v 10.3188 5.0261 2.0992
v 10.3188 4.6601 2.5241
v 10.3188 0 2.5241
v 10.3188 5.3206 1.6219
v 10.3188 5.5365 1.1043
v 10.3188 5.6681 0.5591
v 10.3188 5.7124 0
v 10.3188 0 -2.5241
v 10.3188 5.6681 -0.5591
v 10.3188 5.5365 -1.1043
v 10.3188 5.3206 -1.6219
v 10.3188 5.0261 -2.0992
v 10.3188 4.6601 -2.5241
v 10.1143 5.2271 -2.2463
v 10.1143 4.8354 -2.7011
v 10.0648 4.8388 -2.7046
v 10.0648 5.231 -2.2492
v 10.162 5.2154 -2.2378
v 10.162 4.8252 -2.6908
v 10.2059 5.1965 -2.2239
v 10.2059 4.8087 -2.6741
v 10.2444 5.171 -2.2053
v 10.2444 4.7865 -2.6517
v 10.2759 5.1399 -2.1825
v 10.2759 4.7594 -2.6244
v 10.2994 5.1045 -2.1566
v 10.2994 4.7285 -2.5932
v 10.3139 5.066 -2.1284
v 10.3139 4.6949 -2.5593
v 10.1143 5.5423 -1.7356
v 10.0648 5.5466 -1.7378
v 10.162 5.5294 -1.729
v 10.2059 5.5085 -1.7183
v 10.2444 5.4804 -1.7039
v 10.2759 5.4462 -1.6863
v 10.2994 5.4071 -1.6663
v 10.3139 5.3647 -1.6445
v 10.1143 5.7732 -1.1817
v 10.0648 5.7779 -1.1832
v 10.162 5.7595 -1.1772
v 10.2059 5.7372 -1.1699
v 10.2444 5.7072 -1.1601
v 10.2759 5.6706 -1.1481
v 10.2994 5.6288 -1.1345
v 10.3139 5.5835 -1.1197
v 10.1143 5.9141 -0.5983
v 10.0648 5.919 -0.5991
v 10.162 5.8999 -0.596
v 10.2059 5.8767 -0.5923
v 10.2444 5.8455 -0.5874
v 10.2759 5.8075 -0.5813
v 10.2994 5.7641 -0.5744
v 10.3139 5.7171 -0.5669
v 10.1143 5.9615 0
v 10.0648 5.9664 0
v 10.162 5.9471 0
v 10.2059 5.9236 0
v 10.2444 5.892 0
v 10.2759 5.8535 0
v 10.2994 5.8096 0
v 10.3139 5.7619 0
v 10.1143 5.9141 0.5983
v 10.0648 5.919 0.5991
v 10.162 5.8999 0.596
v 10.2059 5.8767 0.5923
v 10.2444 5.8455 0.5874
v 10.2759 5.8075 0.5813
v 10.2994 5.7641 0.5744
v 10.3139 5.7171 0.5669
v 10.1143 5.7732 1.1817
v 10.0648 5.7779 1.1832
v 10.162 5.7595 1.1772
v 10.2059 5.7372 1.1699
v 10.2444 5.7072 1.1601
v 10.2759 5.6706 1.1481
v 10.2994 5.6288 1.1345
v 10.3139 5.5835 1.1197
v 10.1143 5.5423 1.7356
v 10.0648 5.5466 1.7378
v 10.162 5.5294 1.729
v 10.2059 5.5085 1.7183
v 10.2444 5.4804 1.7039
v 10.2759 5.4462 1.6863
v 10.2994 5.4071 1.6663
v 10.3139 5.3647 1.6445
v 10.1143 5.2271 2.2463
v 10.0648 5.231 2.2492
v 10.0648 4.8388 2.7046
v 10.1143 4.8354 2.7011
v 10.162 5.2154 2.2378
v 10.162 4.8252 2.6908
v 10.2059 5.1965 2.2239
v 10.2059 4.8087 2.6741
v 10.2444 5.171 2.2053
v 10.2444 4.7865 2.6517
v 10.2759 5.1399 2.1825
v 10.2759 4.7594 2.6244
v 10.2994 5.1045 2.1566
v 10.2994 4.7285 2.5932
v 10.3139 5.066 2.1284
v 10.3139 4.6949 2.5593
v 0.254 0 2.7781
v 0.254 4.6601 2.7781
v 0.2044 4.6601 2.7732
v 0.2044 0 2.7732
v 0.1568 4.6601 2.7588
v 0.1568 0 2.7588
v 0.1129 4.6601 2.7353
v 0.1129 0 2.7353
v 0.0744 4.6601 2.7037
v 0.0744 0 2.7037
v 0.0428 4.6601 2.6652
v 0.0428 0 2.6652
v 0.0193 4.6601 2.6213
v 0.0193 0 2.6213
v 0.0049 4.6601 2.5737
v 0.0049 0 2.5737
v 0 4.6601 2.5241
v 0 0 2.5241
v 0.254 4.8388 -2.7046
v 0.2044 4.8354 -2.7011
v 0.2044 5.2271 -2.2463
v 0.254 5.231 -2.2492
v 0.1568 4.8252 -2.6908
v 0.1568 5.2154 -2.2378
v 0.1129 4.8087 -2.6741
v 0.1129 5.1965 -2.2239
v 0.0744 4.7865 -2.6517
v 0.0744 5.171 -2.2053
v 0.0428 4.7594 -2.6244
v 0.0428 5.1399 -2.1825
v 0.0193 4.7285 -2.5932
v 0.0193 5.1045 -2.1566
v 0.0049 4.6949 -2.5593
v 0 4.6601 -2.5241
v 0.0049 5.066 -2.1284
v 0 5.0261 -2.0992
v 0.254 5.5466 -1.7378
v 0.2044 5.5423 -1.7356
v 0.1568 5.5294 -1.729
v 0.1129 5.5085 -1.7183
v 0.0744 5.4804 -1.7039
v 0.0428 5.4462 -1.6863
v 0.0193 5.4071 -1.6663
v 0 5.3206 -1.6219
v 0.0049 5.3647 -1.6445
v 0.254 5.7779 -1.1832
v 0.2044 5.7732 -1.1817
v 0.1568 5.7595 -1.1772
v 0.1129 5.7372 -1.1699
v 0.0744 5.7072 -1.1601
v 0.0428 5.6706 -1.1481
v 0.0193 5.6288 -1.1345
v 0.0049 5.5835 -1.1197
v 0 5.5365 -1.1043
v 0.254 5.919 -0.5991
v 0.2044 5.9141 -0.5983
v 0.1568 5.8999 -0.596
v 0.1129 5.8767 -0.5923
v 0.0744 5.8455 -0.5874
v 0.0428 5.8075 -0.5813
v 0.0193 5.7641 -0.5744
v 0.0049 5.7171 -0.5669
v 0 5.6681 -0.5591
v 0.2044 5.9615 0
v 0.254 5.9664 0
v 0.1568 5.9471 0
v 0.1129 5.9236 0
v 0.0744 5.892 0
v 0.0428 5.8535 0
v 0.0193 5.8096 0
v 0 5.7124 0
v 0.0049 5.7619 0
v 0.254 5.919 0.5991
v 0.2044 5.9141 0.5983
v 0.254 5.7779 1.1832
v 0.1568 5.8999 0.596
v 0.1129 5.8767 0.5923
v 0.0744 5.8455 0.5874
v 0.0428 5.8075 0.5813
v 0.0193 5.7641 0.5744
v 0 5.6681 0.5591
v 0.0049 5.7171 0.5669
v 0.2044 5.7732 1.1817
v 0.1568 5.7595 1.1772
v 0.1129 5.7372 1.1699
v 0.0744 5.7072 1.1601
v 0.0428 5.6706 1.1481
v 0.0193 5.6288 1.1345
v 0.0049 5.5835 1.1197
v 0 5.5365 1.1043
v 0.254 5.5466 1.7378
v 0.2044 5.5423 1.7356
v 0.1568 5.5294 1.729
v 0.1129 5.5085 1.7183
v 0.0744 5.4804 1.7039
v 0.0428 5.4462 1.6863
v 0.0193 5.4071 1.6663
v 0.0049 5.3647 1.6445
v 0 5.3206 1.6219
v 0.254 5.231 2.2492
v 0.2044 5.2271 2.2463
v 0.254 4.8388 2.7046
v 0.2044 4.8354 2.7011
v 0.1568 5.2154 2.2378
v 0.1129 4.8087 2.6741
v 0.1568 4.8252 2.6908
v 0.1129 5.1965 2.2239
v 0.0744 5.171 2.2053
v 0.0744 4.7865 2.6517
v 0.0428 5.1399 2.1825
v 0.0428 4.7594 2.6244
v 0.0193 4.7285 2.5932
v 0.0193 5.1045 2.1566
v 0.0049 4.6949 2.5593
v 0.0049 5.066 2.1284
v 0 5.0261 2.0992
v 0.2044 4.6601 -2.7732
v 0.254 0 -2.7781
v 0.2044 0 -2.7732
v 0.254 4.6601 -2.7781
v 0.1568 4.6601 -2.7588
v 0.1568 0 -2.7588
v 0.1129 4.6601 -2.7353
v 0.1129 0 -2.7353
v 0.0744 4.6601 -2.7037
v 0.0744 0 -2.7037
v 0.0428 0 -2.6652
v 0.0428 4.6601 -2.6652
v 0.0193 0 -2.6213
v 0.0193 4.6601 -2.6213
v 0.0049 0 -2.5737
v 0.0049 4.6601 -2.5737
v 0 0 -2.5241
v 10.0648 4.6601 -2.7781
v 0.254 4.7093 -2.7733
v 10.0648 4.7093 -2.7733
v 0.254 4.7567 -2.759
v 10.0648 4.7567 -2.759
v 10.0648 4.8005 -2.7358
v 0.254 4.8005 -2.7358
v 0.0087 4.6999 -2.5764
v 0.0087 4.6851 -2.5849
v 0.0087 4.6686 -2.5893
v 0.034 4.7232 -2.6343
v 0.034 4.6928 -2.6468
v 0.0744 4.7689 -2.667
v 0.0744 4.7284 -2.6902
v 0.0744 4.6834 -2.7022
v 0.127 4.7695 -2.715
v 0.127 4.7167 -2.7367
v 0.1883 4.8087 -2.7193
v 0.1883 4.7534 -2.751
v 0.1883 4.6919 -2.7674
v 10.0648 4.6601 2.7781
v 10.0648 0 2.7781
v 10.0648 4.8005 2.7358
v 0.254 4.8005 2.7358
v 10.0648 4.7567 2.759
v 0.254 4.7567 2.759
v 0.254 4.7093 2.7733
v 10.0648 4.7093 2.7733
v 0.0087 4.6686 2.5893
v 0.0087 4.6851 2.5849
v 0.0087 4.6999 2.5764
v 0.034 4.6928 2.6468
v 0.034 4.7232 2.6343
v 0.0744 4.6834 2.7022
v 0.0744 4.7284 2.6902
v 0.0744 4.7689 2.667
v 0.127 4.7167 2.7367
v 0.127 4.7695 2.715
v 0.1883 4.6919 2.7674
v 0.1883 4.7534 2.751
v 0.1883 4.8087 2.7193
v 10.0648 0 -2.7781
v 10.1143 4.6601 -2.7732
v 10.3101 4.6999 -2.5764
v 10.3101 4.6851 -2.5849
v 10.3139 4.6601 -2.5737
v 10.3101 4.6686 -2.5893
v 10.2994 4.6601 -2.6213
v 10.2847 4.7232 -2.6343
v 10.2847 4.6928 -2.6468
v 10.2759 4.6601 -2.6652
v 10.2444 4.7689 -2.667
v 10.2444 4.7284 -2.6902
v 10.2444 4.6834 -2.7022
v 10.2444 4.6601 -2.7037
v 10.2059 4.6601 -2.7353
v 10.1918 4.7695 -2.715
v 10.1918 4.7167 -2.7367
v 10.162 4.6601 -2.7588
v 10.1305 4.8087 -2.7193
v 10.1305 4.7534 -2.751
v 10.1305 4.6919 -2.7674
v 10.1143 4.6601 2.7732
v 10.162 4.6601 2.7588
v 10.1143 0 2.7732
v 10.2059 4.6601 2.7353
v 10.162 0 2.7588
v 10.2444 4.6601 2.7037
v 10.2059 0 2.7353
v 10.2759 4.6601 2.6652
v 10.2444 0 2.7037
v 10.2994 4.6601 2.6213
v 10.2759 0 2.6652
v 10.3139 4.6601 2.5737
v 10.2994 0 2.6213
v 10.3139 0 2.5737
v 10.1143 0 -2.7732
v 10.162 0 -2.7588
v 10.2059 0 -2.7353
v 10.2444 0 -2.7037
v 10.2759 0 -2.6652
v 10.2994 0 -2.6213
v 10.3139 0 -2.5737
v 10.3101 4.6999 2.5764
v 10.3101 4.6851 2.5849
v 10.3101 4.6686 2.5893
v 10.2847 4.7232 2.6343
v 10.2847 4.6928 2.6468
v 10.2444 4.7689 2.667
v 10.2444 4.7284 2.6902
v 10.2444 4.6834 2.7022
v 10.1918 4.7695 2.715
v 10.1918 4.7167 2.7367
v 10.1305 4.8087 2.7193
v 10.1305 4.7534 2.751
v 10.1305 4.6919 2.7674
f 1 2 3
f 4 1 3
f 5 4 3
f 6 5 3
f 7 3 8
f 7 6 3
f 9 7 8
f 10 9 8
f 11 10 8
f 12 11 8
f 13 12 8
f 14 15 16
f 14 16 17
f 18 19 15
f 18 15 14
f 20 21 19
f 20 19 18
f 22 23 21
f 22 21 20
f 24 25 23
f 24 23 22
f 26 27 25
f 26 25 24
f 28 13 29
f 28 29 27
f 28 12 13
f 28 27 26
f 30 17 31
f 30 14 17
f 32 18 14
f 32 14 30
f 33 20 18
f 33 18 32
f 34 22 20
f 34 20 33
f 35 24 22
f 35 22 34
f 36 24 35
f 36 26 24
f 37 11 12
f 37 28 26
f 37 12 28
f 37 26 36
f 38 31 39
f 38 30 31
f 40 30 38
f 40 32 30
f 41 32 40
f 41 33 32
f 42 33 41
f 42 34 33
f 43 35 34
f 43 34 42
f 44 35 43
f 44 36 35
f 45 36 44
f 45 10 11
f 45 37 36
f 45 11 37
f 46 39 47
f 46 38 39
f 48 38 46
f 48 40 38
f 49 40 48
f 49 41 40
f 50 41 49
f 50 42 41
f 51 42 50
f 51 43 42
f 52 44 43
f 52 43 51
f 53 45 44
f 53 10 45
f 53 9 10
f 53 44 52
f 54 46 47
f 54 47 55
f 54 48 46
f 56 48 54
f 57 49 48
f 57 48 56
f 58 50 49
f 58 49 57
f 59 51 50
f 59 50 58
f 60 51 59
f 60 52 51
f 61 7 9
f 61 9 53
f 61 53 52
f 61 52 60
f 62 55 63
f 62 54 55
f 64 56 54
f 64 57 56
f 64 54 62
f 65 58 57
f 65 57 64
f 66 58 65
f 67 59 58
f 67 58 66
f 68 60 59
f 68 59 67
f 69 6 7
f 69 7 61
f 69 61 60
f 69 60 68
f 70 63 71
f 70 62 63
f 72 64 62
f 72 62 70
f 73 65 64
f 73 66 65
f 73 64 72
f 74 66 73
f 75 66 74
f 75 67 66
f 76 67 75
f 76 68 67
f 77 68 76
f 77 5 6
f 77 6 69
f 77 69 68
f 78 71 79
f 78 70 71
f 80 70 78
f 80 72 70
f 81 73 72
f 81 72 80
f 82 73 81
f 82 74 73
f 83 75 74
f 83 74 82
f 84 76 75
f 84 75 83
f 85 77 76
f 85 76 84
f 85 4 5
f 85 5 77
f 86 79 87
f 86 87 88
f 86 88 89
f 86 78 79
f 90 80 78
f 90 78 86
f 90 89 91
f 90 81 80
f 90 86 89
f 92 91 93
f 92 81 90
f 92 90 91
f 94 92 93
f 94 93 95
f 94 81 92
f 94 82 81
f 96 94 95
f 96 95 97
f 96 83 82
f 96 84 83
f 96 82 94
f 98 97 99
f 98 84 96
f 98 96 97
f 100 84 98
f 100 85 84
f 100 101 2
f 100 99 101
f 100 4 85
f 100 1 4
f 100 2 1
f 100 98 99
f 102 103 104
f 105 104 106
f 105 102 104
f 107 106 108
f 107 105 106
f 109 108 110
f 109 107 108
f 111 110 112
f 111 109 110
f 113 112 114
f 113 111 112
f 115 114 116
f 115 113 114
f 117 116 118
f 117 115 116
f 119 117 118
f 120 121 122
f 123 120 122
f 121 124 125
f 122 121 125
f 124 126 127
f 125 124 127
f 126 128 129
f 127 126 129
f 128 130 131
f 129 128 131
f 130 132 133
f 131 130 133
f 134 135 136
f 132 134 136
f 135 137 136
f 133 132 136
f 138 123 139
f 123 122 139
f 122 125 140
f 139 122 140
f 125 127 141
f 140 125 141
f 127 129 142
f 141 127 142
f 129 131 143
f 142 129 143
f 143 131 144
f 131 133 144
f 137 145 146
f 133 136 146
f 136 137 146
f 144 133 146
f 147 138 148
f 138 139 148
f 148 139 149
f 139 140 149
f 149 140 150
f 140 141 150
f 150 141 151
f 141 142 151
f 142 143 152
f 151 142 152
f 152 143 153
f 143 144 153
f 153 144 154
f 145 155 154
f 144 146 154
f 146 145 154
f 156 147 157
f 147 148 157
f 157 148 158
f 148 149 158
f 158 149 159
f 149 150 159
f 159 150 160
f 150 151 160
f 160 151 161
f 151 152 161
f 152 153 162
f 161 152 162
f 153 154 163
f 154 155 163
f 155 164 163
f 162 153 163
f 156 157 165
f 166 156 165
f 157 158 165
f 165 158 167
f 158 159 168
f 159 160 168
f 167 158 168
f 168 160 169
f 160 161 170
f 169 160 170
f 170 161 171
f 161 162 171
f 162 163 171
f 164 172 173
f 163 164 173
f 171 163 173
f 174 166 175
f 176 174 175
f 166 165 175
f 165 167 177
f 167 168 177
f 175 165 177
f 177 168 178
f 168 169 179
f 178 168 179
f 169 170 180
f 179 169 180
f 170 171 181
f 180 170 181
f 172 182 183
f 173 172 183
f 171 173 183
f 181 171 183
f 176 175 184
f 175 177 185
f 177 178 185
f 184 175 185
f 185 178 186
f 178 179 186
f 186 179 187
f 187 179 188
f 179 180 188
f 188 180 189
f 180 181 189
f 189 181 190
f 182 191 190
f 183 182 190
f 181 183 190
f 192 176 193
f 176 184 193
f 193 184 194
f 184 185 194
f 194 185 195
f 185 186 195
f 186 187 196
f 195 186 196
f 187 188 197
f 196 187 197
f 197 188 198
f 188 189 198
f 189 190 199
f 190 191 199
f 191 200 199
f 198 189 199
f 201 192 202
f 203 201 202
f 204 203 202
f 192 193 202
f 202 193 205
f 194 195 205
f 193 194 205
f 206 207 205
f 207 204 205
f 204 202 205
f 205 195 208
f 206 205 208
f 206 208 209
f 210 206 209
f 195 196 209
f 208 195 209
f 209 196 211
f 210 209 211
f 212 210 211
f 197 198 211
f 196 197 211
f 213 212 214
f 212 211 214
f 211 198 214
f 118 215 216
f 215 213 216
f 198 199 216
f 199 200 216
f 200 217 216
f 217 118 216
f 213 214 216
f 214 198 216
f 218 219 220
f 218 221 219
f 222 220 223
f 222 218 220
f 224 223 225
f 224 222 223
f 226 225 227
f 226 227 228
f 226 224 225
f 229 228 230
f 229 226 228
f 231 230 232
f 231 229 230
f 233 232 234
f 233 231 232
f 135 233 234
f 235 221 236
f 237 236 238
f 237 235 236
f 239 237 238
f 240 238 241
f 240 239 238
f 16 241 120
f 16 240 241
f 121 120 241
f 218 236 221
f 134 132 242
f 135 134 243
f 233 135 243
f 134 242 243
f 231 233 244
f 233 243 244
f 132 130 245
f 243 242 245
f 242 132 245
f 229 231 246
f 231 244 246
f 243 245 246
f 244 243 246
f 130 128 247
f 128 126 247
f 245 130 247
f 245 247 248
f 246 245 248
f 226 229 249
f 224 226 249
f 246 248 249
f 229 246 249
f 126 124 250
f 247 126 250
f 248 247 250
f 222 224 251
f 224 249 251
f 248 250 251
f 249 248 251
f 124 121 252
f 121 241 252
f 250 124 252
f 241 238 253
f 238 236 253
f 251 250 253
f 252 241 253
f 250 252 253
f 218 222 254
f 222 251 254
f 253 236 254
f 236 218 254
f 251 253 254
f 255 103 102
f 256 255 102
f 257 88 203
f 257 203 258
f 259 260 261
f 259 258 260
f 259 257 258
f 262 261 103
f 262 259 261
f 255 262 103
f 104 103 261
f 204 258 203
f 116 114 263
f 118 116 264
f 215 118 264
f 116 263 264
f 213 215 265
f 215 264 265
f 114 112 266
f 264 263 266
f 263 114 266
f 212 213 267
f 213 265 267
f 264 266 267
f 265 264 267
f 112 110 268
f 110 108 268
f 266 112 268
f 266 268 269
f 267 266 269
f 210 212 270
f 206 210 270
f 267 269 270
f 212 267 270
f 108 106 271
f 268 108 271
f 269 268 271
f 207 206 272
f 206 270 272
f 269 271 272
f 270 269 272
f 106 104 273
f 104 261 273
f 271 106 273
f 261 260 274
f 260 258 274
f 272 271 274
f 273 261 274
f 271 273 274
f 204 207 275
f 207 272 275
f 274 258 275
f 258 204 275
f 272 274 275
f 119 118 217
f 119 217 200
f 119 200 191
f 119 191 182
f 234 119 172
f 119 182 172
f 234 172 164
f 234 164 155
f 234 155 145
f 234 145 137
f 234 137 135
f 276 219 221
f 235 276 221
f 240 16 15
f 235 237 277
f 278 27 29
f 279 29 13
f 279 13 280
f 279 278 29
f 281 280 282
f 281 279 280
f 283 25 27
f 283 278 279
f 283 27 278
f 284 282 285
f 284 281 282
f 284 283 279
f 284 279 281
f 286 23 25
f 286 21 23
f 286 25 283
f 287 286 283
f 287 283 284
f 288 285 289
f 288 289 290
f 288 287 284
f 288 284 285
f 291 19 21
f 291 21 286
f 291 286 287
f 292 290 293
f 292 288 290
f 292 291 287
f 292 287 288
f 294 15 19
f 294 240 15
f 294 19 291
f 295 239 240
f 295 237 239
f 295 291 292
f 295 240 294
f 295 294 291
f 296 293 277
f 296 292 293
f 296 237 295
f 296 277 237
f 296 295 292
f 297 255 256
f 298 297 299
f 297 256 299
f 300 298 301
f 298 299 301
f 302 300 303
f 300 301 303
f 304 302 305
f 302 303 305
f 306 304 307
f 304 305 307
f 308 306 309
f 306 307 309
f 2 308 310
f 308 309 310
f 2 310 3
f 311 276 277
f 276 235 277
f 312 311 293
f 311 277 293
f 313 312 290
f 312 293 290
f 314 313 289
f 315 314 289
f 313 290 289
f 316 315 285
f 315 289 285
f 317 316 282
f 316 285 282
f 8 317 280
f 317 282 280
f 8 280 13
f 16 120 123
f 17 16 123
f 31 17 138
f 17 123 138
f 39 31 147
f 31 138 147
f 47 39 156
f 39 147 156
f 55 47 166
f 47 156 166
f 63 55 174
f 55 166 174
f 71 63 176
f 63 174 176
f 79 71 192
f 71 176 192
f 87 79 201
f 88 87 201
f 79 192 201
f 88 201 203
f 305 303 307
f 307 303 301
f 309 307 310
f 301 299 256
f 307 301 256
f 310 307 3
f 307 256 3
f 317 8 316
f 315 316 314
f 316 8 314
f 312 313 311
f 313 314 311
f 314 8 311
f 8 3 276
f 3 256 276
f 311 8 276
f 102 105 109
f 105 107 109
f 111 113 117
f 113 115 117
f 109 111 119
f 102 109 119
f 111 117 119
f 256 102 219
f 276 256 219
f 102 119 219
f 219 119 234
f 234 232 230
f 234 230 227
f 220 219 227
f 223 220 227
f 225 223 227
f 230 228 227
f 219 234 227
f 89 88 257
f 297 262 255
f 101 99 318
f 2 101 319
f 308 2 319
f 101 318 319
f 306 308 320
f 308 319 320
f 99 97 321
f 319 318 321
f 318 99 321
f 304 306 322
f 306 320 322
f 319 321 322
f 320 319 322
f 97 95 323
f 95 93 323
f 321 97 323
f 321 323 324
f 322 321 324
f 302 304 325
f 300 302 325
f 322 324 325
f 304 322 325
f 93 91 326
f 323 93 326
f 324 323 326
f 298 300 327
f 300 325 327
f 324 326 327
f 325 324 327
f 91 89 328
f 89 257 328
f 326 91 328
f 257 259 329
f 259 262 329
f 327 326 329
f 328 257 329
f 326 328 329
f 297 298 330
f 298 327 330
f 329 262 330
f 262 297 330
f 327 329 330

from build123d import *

# Parameters (mm, degrees)
BOSS_EXTRUDE1_DEPTH = 10.31875
FILLET1_R           = 0.254


with BuildPart() as part:
    # Sketch1 → Boss-Extrude1 (new body)
    with BuildSketch(Plane(origin=(0, 0, 0), x_dir=(0, 0, -1), z_dir=(1, 0, 0))):
        with BuildLine():
            Line((-2.778125, 0), (2.778125, 0))
            Line((2.778125, 0), (2.778125, 4.7625))
            ThreePointArc((2.778125, 4.7625), (0, 5.966386343), (-2.778125, 4.7625))
            Line((-2.778125, 4.7625), (-2.778125, 0))
        make_face()
    extrude(amount=BOSS_EXTRUDE1_DEPTH)

    # Fillet1
    fillet1_edges = [part.edges().sort_by_distance(p)[0] for p in [
        (10.31875, 2.38125, 2.778125),
        (10.31875, 2.38125, -2.778125),
        (0, 2.38125, 2.778125),
        (0, 5.966386343, 0),
        (0, 2.38125, -2.778125),
        (5.159375, 4.7625, 2.778125),
        (5.159375, 4.7625, -2.778125),
        (10.31875, 5.966386343, 0),
    ]]
    fillet(fillet1_edges, radius=FILLET1_R)


solid = part.part
